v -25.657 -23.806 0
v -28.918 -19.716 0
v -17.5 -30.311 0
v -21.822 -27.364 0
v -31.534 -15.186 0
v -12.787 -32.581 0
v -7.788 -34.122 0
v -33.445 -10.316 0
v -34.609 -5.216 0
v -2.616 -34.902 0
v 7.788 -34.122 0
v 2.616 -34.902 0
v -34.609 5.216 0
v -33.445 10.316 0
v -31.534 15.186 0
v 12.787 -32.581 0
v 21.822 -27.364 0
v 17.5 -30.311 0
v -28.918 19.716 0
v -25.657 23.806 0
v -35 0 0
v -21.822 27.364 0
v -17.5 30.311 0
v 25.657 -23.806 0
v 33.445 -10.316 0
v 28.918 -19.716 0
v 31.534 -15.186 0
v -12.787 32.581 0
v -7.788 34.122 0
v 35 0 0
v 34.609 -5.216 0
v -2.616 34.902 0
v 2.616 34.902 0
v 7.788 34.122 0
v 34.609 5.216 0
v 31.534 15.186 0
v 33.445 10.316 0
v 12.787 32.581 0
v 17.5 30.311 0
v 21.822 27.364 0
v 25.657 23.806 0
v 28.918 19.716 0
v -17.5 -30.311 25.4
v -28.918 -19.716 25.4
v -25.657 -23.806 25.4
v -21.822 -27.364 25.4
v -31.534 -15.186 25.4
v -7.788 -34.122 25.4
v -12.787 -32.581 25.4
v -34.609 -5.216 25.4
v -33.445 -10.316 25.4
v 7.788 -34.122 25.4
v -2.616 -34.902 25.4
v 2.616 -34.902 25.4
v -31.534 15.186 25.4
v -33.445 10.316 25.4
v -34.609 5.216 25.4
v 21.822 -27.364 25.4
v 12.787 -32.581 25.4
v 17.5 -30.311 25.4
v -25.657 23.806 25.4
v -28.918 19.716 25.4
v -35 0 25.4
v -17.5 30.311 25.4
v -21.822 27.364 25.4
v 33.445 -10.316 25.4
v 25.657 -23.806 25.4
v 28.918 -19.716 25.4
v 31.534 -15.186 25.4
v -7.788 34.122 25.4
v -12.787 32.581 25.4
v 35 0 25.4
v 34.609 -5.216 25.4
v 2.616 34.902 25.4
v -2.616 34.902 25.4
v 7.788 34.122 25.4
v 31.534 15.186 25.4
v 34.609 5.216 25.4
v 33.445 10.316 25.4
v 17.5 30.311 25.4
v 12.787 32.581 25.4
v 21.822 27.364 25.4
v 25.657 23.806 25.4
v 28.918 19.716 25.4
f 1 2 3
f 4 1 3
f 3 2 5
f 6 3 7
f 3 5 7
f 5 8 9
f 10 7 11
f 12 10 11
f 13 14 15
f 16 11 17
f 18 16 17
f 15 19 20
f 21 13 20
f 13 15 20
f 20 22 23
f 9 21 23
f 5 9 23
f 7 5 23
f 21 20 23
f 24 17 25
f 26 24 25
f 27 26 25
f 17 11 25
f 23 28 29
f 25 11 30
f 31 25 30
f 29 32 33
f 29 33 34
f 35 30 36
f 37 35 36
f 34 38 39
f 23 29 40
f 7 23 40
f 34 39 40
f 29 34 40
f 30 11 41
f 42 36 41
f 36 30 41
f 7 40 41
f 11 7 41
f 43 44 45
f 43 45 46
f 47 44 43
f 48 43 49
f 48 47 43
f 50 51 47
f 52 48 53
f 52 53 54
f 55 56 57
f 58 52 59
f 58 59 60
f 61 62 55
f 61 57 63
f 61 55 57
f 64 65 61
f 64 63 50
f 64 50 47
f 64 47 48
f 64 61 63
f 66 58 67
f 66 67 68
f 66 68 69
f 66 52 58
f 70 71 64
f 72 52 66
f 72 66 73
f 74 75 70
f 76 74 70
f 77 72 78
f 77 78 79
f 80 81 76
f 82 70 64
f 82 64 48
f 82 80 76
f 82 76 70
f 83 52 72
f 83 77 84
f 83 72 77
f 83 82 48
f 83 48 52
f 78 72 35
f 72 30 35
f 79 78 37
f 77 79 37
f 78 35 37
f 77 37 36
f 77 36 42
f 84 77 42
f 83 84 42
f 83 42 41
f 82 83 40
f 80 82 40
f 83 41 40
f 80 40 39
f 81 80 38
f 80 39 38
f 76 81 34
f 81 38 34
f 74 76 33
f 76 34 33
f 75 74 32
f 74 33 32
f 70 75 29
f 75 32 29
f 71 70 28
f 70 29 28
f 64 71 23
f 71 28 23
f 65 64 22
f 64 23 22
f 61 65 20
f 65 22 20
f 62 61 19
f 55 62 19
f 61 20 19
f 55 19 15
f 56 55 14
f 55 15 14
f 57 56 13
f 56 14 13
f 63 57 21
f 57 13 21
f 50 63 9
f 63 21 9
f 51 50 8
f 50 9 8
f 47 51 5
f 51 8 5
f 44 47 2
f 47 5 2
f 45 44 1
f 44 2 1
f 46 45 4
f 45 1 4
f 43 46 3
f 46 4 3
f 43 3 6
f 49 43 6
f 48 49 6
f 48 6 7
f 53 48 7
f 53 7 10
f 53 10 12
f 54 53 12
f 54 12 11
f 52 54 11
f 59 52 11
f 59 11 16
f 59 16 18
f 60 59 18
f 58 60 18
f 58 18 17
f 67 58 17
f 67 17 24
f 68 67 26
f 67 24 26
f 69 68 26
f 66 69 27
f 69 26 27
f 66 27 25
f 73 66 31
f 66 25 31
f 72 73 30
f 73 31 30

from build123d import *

# Parameters (mm, degrees)
F0_R      = 35
F1_DEPTH  = 25.4
F1_FACE_R = 35
F2_DEPTH  = 8
F3_DEPTH  = 10


with BuildPart() as f1:
    # F0 (on Top) → F1 (new body)
    with BuildSketch(Plane.XY):
        Circle(F0_R)
    extrude(amount=F1_DEPTH)

    # F1_face (on face) → F2 (join)
    with BuildSketch(Plane.XY.offset(25.4)):
        Circle(F1_FACE_R)
    extrude(amount=-F2_DEPTH)

    # F1_face (on face) → F3 (join)
    with BuildSketch(Plane.XY.offset(25.4)):
        Circle(F1_FACE_R)
    extrude(amount=-F3_DEPTH)


solid = f1.part
